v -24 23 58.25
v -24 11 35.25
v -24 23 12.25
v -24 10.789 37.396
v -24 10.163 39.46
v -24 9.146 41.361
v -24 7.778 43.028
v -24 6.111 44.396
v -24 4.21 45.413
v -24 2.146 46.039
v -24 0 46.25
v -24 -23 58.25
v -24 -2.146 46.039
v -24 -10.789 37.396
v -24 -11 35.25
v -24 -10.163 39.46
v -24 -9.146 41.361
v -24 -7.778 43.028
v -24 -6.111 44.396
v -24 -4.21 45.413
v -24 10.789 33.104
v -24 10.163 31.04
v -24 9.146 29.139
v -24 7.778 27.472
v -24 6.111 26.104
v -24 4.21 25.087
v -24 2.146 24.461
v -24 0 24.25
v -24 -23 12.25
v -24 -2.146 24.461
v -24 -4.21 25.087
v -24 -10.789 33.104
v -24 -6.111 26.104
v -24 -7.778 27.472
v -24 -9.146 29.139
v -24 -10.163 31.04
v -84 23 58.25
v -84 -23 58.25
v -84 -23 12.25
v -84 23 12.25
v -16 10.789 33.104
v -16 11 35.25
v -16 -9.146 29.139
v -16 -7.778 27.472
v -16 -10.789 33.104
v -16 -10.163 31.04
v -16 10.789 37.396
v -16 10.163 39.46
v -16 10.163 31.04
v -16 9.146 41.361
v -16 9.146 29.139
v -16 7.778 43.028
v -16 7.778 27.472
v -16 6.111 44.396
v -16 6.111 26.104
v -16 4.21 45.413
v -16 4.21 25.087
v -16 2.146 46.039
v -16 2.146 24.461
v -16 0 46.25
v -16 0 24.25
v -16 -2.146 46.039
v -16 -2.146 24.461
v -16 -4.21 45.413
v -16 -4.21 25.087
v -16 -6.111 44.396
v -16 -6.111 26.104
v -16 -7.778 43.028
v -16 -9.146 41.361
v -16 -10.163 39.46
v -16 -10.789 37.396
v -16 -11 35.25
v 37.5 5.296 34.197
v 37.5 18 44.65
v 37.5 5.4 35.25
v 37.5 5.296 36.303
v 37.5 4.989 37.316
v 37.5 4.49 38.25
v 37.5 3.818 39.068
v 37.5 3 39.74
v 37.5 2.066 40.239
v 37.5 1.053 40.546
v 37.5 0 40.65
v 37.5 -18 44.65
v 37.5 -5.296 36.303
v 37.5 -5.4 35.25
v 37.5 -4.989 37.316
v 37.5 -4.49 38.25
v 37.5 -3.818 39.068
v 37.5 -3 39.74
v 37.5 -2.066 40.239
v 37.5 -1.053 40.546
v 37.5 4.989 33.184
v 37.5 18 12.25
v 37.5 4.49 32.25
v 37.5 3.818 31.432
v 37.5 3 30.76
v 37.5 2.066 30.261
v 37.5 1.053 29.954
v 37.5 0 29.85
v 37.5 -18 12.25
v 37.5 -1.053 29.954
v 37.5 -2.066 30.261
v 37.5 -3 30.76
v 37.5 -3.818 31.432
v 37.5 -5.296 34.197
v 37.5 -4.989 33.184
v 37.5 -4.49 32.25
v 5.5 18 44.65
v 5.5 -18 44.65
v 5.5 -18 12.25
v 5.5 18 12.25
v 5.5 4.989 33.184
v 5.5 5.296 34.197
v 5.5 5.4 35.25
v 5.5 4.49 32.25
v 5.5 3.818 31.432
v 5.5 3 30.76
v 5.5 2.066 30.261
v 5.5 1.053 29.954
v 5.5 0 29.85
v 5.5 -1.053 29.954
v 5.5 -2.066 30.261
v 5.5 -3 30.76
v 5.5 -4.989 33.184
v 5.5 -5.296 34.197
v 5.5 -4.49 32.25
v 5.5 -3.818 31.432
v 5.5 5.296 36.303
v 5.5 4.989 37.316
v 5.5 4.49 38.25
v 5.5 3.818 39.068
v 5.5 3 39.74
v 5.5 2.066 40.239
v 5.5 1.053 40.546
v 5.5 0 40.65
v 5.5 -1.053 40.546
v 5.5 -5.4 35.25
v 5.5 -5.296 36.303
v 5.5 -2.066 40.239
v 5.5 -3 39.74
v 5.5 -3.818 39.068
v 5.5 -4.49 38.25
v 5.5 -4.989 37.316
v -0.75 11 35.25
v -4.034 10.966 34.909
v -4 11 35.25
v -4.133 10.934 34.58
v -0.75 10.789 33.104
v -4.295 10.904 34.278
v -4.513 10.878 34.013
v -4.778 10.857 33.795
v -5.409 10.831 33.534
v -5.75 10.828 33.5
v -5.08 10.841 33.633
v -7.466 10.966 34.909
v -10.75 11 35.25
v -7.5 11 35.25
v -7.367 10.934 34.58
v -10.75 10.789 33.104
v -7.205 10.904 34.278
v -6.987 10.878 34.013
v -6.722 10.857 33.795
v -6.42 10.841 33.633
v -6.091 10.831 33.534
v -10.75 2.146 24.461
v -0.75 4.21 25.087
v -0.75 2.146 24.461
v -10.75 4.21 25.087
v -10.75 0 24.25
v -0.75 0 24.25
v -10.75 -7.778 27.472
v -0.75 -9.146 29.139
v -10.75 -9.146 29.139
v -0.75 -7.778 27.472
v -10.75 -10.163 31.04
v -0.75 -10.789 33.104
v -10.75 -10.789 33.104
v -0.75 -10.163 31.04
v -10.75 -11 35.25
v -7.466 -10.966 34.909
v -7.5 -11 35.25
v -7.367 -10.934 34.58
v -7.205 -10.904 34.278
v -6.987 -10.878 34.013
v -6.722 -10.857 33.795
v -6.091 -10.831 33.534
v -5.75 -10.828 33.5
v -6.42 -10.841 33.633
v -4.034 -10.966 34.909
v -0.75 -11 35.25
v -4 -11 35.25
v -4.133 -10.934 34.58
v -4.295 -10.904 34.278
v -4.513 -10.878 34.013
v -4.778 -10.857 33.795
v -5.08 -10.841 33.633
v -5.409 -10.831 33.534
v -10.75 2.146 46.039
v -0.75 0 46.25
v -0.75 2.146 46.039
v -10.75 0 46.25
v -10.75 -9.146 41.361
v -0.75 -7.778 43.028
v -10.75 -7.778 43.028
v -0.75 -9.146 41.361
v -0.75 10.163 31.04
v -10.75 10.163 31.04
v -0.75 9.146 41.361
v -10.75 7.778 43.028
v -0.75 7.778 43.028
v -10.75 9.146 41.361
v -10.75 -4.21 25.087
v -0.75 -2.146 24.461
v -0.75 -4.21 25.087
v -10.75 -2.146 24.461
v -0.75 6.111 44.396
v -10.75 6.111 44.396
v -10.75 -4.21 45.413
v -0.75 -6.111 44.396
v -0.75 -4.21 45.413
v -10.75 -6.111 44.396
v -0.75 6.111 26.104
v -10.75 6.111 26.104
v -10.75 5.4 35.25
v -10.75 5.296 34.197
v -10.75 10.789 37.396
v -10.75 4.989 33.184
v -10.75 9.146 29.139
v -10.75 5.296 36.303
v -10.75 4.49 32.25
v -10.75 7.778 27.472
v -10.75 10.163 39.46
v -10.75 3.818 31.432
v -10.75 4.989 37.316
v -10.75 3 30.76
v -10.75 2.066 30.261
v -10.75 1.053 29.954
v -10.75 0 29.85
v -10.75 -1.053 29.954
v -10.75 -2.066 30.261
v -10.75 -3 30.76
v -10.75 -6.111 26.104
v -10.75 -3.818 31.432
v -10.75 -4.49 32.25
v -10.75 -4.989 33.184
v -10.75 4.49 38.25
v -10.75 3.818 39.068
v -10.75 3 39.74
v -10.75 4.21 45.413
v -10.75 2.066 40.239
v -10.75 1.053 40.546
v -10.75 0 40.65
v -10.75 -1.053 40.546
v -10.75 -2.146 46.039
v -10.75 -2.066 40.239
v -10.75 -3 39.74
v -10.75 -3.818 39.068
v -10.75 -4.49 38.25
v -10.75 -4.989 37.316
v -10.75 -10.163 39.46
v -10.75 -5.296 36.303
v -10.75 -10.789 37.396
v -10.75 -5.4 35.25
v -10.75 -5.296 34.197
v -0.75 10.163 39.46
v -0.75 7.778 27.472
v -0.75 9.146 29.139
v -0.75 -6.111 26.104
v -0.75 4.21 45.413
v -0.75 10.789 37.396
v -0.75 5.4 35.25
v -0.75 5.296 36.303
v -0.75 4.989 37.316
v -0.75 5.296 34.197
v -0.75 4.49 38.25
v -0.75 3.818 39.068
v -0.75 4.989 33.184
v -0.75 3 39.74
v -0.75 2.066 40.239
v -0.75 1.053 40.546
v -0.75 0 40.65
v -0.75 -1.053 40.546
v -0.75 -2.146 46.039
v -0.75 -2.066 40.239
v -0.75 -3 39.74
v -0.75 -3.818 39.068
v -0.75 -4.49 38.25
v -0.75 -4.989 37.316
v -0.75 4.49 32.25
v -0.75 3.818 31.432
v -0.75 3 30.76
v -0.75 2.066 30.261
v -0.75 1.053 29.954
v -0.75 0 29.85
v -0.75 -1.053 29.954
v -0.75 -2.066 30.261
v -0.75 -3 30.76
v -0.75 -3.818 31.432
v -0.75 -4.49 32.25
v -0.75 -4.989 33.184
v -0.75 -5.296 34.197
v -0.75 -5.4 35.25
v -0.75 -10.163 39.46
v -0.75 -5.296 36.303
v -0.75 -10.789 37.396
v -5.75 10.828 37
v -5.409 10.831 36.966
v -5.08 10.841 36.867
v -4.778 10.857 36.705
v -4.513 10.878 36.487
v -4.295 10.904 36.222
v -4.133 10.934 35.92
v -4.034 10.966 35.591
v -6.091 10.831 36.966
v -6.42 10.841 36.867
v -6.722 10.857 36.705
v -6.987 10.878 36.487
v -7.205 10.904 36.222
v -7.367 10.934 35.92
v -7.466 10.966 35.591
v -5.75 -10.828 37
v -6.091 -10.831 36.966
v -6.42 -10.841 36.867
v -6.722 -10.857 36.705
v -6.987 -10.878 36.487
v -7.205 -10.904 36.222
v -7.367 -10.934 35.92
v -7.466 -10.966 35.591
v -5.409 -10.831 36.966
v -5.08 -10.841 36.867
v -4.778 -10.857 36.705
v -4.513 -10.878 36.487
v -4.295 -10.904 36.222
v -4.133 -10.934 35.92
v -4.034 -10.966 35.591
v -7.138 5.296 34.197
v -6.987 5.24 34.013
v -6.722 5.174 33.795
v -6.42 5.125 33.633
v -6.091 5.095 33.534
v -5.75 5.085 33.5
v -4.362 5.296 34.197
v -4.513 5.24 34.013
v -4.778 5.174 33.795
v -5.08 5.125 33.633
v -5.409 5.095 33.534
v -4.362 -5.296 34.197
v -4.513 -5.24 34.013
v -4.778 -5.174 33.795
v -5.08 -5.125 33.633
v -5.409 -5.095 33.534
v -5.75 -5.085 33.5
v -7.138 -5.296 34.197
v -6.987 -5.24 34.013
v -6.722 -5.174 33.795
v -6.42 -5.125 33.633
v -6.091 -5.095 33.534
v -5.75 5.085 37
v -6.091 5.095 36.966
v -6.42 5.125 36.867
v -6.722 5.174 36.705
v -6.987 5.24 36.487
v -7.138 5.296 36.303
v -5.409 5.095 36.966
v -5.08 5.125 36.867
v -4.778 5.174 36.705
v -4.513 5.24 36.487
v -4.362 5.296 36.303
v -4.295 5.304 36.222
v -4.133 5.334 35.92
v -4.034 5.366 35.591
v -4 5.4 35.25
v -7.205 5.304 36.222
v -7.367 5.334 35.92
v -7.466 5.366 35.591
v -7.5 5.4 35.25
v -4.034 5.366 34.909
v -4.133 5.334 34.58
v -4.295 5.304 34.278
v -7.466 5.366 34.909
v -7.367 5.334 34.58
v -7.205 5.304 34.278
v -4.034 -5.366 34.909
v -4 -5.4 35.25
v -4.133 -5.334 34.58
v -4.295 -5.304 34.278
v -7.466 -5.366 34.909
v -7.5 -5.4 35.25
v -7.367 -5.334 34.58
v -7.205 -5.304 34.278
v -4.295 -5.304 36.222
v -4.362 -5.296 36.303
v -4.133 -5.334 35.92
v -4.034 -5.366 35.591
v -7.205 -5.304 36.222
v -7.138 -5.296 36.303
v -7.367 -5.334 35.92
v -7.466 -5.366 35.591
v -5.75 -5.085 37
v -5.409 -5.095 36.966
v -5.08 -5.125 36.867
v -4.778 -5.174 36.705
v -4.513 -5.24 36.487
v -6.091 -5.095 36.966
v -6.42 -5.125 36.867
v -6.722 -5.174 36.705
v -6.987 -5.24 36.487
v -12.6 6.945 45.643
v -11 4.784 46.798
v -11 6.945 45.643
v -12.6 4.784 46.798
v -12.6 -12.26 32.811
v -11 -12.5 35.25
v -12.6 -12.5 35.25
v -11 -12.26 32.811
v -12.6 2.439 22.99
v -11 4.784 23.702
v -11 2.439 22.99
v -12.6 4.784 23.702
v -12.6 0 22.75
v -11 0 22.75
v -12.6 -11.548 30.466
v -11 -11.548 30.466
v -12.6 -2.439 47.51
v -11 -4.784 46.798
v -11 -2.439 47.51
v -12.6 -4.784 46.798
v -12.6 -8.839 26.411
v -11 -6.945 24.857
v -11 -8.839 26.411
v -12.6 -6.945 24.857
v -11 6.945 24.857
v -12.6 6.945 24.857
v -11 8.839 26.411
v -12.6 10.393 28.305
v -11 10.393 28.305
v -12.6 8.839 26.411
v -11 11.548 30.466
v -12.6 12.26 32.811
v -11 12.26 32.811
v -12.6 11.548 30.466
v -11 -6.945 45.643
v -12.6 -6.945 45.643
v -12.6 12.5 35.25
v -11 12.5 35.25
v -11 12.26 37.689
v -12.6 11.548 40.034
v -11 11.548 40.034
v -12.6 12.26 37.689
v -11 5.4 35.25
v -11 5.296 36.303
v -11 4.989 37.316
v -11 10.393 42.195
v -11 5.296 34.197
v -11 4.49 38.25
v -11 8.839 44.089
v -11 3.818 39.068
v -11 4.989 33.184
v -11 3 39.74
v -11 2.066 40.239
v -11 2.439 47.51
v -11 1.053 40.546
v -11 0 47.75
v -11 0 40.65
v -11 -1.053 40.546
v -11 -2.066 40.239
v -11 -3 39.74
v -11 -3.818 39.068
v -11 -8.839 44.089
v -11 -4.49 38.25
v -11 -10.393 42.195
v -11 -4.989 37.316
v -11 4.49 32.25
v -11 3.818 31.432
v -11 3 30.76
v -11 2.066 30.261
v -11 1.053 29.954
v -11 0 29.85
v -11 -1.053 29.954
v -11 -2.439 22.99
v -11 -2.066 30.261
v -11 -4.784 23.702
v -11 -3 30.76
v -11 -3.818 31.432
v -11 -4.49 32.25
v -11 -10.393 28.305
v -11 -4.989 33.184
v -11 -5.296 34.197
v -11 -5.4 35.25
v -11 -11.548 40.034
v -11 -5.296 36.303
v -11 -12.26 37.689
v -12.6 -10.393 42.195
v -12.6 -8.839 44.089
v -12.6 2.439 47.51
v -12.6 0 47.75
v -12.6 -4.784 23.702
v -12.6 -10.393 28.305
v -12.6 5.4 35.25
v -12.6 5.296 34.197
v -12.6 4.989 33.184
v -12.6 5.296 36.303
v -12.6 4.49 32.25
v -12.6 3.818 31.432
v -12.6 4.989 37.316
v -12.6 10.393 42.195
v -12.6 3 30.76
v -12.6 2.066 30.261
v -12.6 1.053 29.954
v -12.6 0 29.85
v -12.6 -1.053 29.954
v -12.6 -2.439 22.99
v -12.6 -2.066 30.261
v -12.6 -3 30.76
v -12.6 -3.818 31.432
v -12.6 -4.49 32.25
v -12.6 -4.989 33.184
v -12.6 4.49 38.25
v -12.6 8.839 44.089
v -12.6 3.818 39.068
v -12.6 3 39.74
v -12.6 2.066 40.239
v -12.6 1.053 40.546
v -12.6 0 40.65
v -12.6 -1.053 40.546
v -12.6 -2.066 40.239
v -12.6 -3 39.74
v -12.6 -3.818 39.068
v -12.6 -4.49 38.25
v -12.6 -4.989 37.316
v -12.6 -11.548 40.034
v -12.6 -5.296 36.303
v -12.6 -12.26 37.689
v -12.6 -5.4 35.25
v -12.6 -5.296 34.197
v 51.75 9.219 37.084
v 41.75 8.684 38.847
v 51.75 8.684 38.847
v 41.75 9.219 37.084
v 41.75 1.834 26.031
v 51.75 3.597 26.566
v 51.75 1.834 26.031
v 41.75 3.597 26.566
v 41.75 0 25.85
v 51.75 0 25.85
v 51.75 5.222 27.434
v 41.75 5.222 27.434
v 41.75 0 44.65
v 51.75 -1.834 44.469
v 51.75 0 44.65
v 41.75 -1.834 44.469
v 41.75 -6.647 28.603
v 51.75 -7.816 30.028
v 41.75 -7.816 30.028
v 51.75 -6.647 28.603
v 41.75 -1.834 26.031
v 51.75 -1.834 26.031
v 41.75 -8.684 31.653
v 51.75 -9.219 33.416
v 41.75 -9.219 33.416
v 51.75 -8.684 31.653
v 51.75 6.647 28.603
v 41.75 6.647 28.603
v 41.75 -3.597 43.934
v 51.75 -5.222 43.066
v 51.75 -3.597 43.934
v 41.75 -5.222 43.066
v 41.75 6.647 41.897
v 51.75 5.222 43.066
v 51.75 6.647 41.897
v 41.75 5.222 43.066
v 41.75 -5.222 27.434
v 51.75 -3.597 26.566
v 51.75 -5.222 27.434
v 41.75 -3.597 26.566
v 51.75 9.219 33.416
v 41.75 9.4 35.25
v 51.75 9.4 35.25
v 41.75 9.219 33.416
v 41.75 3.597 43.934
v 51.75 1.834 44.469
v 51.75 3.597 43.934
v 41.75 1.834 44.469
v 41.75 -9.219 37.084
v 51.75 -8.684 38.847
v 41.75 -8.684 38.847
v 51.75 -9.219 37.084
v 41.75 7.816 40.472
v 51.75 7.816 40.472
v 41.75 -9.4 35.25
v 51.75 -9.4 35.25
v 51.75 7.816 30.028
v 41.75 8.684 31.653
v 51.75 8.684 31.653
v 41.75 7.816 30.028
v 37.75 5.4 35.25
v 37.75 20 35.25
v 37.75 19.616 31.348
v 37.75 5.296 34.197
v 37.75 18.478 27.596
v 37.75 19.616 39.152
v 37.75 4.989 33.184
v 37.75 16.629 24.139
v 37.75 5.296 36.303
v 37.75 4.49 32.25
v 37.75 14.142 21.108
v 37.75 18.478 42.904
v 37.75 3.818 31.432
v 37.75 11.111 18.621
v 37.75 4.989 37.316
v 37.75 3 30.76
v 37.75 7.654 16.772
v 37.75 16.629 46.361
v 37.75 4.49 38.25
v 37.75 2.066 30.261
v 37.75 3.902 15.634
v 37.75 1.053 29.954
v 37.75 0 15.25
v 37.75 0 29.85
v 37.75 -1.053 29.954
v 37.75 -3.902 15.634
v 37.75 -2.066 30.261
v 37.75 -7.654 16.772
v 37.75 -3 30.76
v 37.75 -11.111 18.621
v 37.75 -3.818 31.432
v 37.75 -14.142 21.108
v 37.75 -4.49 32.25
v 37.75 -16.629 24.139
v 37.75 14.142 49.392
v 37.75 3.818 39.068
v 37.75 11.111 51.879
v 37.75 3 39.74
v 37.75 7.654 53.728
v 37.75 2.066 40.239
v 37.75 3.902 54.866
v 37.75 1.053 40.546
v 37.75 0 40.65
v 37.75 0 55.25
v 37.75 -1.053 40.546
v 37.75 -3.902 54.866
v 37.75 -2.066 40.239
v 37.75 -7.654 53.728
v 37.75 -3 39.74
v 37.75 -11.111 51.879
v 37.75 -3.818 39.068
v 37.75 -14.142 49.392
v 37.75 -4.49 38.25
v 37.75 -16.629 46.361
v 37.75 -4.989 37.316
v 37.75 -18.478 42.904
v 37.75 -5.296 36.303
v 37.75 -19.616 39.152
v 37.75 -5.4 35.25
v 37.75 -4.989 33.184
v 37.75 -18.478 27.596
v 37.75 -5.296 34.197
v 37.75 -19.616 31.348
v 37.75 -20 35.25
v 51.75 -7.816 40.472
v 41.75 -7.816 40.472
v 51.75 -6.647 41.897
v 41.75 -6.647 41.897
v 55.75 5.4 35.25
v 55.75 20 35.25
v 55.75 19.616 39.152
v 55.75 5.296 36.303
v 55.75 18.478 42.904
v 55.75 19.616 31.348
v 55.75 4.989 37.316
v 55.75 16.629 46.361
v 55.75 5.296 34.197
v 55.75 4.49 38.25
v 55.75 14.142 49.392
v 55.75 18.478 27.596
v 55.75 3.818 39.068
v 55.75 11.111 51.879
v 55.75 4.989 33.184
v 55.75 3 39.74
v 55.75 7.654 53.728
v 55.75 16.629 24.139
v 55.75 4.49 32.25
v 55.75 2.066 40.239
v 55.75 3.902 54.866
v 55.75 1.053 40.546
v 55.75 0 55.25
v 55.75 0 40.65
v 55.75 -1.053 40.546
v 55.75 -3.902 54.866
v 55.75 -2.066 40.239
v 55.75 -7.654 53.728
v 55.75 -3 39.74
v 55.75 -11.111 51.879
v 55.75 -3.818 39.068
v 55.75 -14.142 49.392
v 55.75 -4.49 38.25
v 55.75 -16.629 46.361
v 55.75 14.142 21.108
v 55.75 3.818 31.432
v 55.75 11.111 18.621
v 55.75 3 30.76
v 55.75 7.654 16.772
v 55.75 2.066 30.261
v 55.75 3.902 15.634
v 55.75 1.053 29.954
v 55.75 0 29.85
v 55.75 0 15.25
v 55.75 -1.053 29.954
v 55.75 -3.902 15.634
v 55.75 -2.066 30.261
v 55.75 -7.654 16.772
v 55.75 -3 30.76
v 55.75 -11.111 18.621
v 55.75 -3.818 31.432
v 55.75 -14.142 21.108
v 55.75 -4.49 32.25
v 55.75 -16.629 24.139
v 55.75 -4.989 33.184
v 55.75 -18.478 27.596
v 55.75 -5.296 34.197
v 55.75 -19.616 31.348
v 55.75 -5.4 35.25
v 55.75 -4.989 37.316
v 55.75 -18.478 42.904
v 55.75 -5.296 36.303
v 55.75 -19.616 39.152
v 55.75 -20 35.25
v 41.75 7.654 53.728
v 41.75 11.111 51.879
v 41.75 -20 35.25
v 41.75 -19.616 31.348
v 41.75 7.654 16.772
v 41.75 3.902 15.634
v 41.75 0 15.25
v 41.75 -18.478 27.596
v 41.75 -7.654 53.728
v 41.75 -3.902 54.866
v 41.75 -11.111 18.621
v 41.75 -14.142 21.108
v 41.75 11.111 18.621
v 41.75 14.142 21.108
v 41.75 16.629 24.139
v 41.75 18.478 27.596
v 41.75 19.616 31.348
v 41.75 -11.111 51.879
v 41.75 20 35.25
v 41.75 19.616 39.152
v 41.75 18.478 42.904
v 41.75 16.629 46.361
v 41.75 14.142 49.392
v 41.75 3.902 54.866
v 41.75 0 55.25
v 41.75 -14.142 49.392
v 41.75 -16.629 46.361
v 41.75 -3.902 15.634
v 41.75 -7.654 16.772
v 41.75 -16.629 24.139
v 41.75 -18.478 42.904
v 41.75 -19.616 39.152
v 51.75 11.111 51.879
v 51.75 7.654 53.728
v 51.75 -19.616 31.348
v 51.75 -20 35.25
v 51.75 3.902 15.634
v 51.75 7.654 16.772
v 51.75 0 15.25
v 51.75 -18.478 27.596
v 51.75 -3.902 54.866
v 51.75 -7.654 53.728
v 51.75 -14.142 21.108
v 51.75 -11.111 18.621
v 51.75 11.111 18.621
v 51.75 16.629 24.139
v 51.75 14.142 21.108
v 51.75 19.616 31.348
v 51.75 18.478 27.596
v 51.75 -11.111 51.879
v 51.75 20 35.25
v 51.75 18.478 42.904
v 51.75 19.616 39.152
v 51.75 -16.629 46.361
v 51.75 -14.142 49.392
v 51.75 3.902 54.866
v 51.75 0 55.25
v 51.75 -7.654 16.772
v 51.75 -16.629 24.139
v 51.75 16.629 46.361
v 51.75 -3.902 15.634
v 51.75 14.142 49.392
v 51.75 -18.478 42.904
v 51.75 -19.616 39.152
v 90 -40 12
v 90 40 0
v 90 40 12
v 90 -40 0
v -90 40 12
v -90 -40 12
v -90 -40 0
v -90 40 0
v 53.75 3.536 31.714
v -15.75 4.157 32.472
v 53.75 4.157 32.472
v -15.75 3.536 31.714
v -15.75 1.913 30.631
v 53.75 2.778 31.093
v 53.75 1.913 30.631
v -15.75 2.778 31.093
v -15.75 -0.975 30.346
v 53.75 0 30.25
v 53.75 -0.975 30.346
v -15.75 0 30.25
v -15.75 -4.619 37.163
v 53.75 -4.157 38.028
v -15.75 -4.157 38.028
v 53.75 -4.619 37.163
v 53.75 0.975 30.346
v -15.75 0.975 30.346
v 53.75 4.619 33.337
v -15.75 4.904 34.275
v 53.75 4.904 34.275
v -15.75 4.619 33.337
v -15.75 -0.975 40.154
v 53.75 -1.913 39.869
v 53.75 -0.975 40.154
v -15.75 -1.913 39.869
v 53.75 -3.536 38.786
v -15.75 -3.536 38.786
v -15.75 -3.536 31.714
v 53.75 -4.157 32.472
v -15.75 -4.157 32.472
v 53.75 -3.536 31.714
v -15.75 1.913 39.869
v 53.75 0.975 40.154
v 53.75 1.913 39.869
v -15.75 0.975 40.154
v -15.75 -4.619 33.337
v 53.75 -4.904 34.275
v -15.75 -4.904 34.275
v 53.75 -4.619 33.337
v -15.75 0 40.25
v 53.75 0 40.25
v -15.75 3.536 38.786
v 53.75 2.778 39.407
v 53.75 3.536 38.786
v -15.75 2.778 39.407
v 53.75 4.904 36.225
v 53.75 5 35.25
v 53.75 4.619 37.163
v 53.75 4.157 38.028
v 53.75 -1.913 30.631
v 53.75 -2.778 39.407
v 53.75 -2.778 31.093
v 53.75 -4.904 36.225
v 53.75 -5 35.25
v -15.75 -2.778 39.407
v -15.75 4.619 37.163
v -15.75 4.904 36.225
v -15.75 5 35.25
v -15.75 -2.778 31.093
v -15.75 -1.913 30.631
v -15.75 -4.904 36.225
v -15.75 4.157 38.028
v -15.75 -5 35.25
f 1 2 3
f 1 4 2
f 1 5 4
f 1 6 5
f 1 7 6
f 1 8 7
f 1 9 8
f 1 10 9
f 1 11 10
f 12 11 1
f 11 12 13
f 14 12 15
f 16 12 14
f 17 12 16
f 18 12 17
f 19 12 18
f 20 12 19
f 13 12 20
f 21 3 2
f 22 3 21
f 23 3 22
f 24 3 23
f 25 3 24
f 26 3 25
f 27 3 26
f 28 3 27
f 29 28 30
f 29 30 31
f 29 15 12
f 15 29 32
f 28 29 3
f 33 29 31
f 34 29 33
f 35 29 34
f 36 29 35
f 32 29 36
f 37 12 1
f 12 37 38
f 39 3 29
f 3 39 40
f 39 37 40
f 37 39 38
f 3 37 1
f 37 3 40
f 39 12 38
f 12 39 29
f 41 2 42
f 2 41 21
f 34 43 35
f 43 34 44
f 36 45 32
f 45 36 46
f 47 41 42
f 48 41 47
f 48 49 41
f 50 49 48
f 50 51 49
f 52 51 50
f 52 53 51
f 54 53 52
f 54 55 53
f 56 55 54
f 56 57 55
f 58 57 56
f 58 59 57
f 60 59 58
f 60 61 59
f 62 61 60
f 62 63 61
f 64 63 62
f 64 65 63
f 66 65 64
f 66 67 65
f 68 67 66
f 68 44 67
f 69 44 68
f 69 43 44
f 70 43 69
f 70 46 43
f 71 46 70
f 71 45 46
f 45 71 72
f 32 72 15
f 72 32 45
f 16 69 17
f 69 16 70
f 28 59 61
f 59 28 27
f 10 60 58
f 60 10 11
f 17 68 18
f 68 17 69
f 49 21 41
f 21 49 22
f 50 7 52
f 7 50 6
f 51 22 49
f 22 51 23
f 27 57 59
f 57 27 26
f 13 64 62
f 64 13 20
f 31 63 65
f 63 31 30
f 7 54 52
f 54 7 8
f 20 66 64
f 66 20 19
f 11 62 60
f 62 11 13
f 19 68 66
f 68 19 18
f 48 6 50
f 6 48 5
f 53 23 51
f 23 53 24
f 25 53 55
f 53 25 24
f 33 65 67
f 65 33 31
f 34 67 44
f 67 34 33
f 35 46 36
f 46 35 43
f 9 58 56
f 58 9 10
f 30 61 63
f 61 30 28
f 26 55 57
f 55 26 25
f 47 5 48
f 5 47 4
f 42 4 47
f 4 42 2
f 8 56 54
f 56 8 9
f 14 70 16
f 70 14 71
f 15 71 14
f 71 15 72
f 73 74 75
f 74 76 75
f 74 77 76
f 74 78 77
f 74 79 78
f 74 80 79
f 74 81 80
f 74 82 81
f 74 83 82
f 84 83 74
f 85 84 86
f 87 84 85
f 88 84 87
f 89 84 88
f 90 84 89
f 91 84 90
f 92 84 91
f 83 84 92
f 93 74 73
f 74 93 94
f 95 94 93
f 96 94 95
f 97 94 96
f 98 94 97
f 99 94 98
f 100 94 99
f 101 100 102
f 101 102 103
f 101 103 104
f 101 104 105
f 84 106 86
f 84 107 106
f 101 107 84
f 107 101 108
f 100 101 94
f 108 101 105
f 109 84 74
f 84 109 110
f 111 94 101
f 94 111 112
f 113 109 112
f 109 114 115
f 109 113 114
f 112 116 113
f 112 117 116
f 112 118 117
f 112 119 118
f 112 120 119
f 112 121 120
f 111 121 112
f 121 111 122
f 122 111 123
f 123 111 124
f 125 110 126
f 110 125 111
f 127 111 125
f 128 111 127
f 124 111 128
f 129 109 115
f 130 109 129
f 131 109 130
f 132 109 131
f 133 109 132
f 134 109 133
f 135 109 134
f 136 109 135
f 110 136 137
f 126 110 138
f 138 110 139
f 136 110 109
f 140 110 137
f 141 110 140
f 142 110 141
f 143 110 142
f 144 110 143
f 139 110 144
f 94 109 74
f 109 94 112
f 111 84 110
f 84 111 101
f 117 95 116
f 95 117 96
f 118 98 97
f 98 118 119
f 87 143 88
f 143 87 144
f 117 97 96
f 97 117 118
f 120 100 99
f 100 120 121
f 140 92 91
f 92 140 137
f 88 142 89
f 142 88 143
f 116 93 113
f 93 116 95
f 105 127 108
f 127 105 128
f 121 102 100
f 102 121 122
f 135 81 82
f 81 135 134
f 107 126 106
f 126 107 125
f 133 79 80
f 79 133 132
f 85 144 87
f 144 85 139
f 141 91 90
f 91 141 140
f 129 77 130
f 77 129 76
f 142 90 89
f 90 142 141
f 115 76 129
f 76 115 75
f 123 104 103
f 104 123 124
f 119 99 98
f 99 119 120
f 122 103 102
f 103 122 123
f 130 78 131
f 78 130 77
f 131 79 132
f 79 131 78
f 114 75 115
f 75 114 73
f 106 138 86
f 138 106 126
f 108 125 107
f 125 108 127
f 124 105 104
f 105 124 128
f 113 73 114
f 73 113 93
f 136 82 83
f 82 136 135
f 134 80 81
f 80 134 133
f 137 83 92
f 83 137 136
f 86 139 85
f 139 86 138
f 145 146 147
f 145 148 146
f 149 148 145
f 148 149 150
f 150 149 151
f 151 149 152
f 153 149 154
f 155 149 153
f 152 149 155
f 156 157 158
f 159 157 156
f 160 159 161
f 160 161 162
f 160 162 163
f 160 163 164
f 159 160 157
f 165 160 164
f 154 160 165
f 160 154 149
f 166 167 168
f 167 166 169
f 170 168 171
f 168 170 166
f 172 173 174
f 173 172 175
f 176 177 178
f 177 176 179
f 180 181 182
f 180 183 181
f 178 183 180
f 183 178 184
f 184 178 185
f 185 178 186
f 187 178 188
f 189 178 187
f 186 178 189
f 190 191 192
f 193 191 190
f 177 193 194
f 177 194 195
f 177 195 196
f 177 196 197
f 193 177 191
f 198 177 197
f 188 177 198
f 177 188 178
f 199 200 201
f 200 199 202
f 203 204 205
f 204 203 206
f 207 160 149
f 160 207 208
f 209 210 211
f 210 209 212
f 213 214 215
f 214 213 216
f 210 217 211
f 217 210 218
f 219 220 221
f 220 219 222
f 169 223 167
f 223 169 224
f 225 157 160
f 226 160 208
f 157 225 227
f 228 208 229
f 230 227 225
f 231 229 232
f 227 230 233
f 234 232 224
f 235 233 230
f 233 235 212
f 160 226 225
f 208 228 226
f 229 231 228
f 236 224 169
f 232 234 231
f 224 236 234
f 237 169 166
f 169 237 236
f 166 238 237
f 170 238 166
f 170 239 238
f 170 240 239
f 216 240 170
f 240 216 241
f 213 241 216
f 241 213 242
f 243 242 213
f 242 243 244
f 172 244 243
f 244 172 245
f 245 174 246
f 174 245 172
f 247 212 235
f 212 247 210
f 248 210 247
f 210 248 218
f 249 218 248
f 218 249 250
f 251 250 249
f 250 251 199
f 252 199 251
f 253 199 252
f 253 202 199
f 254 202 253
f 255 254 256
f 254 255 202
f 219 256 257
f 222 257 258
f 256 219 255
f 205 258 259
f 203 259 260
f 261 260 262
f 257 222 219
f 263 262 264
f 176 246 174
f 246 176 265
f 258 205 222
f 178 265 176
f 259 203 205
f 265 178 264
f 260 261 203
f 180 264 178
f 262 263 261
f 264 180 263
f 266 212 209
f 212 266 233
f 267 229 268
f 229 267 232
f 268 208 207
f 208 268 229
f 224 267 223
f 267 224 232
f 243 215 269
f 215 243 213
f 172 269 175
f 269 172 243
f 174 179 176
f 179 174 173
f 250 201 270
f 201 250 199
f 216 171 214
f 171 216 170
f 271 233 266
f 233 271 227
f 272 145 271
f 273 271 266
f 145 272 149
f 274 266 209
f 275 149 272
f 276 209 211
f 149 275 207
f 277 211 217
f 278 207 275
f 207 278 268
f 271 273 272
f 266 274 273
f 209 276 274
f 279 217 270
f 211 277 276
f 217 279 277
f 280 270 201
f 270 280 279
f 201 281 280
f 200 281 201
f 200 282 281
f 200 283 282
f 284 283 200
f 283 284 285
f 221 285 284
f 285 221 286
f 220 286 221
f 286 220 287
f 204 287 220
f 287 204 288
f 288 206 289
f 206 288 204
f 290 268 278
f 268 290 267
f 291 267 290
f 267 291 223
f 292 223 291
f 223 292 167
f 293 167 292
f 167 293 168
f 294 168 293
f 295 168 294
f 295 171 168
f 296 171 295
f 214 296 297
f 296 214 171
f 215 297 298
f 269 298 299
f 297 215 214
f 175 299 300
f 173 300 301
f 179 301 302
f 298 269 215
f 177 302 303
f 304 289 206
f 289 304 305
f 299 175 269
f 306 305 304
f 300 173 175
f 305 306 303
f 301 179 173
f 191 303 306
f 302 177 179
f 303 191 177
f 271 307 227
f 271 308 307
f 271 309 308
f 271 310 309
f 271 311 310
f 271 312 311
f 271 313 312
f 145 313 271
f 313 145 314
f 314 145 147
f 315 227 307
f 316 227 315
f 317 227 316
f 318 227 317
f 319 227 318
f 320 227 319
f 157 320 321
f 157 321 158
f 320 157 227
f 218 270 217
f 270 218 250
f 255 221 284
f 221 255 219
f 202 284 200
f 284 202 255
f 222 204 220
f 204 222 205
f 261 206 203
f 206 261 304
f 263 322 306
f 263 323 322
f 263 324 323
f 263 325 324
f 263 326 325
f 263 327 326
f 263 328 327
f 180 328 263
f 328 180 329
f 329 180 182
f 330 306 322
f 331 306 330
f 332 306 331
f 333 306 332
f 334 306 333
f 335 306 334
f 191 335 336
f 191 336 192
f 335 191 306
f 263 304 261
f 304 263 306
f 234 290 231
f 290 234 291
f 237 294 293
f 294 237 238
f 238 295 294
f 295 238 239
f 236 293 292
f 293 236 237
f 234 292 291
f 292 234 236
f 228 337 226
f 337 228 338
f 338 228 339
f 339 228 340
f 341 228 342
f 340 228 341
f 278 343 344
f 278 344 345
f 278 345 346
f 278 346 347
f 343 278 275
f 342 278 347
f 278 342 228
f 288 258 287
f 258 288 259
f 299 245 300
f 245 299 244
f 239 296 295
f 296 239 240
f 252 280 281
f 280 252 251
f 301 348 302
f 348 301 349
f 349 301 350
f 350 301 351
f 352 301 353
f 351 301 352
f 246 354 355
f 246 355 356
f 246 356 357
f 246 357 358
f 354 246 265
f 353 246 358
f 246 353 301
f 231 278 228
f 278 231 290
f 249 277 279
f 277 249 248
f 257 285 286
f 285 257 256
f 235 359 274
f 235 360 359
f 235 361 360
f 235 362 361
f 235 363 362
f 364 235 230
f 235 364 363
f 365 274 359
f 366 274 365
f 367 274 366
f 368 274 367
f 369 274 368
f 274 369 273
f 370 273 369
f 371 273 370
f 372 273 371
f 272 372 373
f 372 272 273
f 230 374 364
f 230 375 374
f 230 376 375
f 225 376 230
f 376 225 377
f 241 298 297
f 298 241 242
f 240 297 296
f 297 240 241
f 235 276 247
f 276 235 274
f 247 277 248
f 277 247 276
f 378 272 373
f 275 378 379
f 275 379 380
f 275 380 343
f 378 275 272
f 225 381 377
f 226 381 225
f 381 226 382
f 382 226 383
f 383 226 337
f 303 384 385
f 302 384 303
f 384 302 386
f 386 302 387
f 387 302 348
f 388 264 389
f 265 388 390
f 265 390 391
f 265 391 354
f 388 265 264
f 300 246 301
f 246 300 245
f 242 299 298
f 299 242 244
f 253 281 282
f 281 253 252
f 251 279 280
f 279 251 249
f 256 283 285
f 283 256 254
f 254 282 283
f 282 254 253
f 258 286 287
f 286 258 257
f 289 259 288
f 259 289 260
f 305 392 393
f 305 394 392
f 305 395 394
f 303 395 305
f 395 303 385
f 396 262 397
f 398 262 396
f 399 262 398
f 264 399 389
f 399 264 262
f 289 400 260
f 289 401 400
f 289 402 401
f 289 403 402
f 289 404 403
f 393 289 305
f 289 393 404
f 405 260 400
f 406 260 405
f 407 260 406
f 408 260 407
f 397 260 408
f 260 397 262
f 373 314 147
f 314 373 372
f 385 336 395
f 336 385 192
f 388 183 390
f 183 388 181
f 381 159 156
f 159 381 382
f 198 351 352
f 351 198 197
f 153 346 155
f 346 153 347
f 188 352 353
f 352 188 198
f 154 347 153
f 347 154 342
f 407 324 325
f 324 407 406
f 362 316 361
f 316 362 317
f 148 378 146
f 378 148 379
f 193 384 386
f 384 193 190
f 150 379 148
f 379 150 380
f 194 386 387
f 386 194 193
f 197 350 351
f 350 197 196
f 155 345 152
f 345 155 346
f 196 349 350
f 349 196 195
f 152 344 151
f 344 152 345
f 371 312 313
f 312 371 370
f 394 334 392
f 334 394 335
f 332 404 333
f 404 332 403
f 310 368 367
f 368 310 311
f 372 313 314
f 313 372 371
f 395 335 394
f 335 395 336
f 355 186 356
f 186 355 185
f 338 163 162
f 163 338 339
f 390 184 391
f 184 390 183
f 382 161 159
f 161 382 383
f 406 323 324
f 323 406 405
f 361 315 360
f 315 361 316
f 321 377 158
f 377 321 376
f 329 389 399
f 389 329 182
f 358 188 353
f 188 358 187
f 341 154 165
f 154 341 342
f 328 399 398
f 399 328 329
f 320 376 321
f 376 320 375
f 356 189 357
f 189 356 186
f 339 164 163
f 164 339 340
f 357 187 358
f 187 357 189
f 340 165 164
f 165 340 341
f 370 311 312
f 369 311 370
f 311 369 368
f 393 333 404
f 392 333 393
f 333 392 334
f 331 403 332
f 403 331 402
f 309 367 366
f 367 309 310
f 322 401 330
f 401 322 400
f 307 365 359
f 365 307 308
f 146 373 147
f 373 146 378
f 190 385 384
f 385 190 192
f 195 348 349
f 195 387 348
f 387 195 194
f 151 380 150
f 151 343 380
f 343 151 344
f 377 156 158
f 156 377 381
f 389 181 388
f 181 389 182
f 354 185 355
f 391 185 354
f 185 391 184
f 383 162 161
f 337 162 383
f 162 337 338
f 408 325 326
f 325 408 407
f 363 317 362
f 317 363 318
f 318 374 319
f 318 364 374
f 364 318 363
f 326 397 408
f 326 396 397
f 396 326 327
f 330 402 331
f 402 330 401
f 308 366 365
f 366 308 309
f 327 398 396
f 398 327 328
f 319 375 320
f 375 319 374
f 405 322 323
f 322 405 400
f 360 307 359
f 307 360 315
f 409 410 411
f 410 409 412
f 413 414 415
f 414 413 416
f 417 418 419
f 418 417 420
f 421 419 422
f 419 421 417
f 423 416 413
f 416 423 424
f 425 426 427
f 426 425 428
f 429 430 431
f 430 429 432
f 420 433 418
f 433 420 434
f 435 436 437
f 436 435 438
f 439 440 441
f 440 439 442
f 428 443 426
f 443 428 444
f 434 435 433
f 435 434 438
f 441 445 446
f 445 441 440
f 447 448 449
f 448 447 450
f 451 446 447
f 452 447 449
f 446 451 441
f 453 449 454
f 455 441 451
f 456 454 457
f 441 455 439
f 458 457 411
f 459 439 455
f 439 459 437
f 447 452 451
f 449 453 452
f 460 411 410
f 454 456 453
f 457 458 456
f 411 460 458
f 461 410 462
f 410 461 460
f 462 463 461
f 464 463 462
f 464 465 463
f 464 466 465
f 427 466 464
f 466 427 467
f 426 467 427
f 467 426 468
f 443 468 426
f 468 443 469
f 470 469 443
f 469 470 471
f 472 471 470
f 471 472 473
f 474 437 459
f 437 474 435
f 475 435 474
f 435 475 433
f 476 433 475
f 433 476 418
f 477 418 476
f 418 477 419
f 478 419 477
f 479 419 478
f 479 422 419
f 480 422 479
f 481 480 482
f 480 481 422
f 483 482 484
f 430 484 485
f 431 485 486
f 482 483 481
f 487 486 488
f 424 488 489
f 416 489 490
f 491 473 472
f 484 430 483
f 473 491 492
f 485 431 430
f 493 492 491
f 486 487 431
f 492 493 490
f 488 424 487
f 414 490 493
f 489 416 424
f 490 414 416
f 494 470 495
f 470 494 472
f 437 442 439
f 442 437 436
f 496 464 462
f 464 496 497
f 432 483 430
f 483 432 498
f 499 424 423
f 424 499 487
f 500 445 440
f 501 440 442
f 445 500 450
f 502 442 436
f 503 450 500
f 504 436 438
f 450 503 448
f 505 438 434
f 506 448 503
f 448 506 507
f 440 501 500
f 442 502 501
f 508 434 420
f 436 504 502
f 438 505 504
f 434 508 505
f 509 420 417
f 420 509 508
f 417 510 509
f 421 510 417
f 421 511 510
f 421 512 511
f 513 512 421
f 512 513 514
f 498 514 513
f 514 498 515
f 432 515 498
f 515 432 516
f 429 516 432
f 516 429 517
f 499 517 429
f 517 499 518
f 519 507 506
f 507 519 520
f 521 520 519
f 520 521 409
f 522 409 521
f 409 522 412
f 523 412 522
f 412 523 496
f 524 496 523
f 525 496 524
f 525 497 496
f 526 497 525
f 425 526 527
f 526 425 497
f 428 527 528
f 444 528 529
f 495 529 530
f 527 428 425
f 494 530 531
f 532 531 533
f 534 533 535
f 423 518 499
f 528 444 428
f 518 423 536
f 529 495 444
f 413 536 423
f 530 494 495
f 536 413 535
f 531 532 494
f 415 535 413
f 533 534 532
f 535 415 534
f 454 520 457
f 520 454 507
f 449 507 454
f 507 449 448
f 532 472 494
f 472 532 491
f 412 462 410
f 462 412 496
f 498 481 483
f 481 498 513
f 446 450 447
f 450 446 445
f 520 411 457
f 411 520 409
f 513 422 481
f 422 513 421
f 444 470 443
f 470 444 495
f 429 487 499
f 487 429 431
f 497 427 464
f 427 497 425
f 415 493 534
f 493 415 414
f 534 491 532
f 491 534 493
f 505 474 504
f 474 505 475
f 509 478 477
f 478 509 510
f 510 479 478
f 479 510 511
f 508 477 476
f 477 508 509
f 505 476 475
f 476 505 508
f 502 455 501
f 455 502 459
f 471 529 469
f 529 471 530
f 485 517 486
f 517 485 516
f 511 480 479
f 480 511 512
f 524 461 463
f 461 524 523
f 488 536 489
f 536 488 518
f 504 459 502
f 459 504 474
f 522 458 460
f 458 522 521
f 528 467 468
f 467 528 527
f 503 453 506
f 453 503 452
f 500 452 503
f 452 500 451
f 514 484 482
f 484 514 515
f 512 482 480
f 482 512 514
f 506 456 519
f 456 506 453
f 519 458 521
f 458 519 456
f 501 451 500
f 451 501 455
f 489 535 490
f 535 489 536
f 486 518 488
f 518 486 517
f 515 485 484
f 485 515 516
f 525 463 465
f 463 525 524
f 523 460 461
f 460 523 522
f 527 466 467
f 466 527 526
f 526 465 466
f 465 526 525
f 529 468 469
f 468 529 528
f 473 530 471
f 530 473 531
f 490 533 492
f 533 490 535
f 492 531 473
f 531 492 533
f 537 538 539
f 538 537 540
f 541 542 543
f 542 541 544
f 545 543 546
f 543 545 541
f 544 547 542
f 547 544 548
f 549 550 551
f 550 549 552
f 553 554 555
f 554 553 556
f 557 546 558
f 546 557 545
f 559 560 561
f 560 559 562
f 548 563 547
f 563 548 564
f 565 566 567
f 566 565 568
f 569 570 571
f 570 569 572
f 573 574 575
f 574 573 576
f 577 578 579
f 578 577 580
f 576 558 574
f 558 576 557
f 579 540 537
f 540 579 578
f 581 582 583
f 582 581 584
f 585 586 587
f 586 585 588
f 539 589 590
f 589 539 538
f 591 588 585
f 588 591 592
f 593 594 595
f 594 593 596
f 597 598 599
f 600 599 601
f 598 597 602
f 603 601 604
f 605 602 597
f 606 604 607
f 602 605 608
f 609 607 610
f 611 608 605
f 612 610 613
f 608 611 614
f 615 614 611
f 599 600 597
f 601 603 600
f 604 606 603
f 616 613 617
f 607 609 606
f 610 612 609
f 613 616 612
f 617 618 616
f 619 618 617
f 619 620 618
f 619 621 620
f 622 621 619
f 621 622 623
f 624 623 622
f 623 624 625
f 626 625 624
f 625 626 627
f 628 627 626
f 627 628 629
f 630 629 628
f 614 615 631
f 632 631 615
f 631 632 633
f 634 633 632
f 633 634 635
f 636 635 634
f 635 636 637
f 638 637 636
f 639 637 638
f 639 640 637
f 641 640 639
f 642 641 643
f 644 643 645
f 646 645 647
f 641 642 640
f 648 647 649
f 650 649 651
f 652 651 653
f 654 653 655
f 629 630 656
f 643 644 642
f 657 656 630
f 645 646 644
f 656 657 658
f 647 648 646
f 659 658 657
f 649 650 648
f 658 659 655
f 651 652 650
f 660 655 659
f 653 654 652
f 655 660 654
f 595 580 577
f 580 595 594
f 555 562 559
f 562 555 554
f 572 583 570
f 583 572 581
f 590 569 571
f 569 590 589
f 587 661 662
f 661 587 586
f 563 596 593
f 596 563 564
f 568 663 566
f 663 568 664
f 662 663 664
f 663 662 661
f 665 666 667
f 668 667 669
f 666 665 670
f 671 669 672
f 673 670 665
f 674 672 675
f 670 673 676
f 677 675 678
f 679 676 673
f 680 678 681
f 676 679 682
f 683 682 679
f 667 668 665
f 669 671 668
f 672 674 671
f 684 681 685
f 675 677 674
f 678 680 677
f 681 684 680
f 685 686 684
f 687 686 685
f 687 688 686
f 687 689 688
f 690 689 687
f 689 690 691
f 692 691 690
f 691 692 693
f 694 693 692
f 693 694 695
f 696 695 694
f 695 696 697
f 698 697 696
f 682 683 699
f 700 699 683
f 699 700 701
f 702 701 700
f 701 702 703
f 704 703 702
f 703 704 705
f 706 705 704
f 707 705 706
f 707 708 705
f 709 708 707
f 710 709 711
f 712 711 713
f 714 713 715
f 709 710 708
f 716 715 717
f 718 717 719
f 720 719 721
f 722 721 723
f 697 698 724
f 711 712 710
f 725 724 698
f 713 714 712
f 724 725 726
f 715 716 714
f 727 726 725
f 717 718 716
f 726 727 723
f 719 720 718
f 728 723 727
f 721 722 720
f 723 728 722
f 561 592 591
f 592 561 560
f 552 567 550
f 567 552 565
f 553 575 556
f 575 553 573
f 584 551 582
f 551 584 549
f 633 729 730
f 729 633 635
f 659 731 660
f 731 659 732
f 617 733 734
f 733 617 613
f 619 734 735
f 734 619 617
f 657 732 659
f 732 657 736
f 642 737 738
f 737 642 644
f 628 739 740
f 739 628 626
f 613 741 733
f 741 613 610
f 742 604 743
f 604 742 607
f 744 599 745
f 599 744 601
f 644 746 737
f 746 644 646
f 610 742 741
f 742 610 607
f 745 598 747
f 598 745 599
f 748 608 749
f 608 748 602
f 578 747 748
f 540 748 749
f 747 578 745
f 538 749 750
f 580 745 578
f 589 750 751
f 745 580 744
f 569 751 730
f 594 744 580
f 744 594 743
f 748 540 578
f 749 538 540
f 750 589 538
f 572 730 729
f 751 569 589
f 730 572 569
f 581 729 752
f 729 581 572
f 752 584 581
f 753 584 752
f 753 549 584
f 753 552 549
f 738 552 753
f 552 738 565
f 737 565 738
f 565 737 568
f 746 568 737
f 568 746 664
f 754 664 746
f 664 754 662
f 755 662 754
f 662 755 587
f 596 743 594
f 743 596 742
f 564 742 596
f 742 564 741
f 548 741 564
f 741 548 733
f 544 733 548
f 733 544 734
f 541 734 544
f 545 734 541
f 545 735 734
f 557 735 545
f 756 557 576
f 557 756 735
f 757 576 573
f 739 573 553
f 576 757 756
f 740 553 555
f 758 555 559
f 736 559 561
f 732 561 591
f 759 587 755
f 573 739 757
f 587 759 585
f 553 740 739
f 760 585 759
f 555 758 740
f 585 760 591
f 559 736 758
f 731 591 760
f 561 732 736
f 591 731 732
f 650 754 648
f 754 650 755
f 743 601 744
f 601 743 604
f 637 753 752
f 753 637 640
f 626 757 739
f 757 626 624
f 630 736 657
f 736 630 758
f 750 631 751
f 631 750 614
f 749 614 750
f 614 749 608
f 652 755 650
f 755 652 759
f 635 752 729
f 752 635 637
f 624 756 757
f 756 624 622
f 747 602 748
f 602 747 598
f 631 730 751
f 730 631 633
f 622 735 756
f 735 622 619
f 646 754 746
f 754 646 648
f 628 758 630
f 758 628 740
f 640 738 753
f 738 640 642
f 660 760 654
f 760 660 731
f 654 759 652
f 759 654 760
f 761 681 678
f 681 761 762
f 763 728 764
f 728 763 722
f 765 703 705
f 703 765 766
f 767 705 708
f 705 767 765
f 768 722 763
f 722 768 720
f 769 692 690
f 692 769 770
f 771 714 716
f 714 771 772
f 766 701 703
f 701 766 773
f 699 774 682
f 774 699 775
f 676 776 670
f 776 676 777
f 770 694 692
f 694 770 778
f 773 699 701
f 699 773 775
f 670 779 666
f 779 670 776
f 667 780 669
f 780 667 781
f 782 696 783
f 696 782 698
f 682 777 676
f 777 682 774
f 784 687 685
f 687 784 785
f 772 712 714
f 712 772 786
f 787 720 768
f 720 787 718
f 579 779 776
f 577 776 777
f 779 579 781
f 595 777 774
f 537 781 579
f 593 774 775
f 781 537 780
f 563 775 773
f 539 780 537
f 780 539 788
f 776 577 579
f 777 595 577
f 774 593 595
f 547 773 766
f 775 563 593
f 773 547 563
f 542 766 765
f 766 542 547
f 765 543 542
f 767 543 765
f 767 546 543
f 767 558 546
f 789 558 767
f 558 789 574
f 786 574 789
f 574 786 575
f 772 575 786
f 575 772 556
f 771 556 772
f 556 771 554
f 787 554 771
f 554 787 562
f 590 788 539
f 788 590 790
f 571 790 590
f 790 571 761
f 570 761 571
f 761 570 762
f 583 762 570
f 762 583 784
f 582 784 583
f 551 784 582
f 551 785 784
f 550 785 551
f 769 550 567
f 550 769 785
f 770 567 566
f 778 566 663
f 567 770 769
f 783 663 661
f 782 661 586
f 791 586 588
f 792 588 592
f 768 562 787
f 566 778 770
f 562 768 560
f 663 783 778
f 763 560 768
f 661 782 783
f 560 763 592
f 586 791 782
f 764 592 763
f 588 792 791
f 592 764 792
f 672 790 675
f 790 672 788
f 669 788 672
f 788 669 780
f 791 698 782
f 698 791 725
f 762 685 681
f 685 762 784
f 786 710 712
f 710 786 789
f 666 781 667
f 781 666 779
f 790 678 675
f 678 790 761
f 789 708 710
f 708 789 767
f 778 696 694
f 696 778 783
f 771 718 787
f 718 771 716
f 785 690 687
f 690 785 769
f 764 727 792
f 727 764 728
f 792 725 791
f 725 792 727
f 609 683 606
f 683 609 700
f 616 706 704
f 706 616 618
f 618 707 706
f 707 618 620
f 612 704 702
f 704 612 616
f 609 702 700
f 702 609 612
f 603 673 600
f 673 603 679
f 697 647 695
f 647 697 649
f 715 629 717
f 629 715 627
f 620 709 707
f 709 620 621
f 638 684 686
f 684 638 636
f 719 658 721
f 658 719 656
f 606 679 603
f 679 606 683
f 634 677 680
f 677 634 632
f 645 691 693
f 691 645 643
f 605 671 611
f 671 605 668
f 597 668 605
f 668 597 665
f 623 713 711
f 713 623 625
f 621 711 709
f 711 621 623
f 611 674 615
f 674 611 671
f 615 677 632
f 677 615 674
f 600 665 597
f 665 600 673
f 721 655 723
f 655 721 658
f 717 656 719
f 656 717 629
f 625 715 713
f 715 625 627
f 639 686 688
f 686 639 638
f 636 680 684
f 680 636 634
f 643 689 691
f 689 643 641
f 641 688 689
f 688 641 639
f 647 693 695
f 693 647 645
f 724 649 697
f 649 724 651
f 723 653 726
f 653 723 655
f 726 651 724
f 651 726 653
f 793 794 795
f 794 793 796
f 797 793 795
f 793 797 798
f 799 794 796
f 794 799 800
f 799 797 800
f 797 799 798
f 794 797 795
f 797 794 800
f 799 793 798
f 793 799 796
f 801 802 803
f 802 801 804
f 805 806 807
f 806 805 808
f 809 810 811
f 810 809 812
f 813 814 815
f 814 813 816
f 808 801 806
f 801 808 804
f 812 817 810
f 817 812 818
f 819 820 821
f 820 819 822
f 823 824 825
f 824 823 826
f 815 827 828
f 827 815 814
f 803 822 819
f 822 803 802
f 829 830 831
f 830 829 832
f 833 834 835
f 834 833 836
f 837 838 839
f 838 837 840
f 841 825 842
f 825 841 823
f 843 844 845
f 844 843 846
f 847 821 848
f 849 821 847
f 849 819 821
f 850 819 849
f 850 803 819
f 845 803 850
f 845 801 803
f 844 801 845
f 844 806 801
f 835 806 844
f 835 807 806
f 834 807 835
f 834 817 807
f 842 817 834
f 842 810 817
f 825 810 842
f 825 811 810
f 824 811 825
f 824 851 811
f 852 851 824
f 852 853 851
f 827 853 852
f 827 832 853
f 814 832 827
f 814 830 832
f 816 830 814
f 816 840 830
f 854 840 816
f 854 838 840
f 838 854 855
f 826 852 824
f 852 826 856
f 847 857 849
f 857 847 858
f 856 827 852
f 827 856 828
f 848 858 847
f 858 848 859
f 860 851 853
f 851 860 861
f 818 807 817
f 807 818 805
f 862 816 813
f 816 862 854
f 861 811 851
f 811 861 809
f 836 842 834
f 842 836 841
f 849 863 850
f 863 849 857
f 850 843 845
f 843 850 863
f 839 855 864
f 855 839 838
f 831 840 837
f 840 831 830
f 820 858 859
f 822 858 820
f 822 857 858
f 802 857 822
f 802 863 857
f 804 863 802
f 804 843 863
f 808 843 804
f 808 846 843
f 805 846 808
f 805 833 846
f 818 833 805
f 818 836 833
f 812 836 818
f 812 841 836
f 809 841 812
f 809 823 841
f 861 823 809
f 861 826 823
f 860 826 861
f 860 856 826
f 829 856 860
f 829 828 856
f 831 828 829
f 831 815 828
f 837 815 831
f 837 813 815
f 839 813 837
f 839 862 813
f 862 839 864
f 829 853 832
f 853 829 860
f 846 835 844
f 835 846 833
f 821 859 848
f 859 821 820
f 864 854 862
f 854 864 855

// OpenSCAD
$fn = 32;

// ------------------------------------------------------------------------
// Motor drive station: motor 60 x 46 mm, shaft d10, pulley d40
// Every part is its own module, assembly() places every instance.
// ------------------------------------------------------------------------

// --- part 1 ---
module station_bed() {
  difference() {
    translate([-90, -40, 0]) cube([180, 80, 12]);
  }
}

// --- part 2 ---
module drive_motor() {
  union() {
    translate([-30, -23, 0]) cube([60, 46, 46]);
    translate([34, 0, 23]) rotate([0, 90, 0]) cylinder(h = 8, d = 22, center = true);
  }
}

// --- part 3 ---
module pillow_block() {
  difference() {
    translate([-16, -18, 0]) cube([32, 36, 32.4]);
    translate([0, 0, 23]) rotate([0, 90, 0]) cylinder(h = 34, d = 10.8, center = true);
  }
}

// --- part 4 ---
module drive_shaft() {
  translate([0, 0, -34.75]) cylinder(h = 69.5, d = 10);
}

// --- part 5 ---
module shaft_collar() {
  difference() {
    cylinder(h = 10, d = 22);
    translate([0, 0, -1]) cylinder(h = 12, d = 10.8);
    translate([0, 0, 5]) rotate([90, 0, 0]) cylinder(h = 24, d = 3.5, center = true);
  }
}

// --- part 6 ---
module collar_washer() {
  difference() {
      translate([0, 0, 0]) cylinder(h = 1.6, d = 25);
      translate([0, 0, -1]) cylinder(h = 3.6, d = 10.8);
    }
}

// --- part 7 ---
module drive_pulley() {
  difference() {
    union() {
      cylinder(h = 18, d = 18.8);
      cylinder(h = 4, d = 40);
      translate([0, 0, 14]) cylinder(h = 4, d = 40);
    }
    translate([0, 0, -1]) cylinder(h = 20, d = 10.8);
  }
}

// --- assembly ---
module assembly() {
  color([0.80, 0.24, 0.20]) translate([0, 0, 0]) rotate([0, 0, 0]) station_bed();
  color([0.20, 0.45, 0.75]) translate([-54, 0, 12.25]) rotate([0, 0, 0]) drive_motor();
  color([0.25, 0.62, 0.32]) translate([21.5, 0, 12.25]) rotate([0, 0, 0]) pillow_block();
  color([0.92, 0.70, 0.18]) translate([19, 0, 35.25]) rotate([0, 90, 0]) drive_shaft();
  color([0.58, 0.35, 0.70]) translate([-10.75, 0, 35.25]) rotate([0, 90, 0]) shaft_collar();
  color([0.16, 0.66, 0.66]) translate([-12.6, 0, 35.25]) rotate([0, 90, 0]) collar_washer();
  color([0.85, 0.48, 0.18]) translate([37.75, 0, 35.25]) rotate([0, 90, 0]) drive_pulley();
}

assembly();
